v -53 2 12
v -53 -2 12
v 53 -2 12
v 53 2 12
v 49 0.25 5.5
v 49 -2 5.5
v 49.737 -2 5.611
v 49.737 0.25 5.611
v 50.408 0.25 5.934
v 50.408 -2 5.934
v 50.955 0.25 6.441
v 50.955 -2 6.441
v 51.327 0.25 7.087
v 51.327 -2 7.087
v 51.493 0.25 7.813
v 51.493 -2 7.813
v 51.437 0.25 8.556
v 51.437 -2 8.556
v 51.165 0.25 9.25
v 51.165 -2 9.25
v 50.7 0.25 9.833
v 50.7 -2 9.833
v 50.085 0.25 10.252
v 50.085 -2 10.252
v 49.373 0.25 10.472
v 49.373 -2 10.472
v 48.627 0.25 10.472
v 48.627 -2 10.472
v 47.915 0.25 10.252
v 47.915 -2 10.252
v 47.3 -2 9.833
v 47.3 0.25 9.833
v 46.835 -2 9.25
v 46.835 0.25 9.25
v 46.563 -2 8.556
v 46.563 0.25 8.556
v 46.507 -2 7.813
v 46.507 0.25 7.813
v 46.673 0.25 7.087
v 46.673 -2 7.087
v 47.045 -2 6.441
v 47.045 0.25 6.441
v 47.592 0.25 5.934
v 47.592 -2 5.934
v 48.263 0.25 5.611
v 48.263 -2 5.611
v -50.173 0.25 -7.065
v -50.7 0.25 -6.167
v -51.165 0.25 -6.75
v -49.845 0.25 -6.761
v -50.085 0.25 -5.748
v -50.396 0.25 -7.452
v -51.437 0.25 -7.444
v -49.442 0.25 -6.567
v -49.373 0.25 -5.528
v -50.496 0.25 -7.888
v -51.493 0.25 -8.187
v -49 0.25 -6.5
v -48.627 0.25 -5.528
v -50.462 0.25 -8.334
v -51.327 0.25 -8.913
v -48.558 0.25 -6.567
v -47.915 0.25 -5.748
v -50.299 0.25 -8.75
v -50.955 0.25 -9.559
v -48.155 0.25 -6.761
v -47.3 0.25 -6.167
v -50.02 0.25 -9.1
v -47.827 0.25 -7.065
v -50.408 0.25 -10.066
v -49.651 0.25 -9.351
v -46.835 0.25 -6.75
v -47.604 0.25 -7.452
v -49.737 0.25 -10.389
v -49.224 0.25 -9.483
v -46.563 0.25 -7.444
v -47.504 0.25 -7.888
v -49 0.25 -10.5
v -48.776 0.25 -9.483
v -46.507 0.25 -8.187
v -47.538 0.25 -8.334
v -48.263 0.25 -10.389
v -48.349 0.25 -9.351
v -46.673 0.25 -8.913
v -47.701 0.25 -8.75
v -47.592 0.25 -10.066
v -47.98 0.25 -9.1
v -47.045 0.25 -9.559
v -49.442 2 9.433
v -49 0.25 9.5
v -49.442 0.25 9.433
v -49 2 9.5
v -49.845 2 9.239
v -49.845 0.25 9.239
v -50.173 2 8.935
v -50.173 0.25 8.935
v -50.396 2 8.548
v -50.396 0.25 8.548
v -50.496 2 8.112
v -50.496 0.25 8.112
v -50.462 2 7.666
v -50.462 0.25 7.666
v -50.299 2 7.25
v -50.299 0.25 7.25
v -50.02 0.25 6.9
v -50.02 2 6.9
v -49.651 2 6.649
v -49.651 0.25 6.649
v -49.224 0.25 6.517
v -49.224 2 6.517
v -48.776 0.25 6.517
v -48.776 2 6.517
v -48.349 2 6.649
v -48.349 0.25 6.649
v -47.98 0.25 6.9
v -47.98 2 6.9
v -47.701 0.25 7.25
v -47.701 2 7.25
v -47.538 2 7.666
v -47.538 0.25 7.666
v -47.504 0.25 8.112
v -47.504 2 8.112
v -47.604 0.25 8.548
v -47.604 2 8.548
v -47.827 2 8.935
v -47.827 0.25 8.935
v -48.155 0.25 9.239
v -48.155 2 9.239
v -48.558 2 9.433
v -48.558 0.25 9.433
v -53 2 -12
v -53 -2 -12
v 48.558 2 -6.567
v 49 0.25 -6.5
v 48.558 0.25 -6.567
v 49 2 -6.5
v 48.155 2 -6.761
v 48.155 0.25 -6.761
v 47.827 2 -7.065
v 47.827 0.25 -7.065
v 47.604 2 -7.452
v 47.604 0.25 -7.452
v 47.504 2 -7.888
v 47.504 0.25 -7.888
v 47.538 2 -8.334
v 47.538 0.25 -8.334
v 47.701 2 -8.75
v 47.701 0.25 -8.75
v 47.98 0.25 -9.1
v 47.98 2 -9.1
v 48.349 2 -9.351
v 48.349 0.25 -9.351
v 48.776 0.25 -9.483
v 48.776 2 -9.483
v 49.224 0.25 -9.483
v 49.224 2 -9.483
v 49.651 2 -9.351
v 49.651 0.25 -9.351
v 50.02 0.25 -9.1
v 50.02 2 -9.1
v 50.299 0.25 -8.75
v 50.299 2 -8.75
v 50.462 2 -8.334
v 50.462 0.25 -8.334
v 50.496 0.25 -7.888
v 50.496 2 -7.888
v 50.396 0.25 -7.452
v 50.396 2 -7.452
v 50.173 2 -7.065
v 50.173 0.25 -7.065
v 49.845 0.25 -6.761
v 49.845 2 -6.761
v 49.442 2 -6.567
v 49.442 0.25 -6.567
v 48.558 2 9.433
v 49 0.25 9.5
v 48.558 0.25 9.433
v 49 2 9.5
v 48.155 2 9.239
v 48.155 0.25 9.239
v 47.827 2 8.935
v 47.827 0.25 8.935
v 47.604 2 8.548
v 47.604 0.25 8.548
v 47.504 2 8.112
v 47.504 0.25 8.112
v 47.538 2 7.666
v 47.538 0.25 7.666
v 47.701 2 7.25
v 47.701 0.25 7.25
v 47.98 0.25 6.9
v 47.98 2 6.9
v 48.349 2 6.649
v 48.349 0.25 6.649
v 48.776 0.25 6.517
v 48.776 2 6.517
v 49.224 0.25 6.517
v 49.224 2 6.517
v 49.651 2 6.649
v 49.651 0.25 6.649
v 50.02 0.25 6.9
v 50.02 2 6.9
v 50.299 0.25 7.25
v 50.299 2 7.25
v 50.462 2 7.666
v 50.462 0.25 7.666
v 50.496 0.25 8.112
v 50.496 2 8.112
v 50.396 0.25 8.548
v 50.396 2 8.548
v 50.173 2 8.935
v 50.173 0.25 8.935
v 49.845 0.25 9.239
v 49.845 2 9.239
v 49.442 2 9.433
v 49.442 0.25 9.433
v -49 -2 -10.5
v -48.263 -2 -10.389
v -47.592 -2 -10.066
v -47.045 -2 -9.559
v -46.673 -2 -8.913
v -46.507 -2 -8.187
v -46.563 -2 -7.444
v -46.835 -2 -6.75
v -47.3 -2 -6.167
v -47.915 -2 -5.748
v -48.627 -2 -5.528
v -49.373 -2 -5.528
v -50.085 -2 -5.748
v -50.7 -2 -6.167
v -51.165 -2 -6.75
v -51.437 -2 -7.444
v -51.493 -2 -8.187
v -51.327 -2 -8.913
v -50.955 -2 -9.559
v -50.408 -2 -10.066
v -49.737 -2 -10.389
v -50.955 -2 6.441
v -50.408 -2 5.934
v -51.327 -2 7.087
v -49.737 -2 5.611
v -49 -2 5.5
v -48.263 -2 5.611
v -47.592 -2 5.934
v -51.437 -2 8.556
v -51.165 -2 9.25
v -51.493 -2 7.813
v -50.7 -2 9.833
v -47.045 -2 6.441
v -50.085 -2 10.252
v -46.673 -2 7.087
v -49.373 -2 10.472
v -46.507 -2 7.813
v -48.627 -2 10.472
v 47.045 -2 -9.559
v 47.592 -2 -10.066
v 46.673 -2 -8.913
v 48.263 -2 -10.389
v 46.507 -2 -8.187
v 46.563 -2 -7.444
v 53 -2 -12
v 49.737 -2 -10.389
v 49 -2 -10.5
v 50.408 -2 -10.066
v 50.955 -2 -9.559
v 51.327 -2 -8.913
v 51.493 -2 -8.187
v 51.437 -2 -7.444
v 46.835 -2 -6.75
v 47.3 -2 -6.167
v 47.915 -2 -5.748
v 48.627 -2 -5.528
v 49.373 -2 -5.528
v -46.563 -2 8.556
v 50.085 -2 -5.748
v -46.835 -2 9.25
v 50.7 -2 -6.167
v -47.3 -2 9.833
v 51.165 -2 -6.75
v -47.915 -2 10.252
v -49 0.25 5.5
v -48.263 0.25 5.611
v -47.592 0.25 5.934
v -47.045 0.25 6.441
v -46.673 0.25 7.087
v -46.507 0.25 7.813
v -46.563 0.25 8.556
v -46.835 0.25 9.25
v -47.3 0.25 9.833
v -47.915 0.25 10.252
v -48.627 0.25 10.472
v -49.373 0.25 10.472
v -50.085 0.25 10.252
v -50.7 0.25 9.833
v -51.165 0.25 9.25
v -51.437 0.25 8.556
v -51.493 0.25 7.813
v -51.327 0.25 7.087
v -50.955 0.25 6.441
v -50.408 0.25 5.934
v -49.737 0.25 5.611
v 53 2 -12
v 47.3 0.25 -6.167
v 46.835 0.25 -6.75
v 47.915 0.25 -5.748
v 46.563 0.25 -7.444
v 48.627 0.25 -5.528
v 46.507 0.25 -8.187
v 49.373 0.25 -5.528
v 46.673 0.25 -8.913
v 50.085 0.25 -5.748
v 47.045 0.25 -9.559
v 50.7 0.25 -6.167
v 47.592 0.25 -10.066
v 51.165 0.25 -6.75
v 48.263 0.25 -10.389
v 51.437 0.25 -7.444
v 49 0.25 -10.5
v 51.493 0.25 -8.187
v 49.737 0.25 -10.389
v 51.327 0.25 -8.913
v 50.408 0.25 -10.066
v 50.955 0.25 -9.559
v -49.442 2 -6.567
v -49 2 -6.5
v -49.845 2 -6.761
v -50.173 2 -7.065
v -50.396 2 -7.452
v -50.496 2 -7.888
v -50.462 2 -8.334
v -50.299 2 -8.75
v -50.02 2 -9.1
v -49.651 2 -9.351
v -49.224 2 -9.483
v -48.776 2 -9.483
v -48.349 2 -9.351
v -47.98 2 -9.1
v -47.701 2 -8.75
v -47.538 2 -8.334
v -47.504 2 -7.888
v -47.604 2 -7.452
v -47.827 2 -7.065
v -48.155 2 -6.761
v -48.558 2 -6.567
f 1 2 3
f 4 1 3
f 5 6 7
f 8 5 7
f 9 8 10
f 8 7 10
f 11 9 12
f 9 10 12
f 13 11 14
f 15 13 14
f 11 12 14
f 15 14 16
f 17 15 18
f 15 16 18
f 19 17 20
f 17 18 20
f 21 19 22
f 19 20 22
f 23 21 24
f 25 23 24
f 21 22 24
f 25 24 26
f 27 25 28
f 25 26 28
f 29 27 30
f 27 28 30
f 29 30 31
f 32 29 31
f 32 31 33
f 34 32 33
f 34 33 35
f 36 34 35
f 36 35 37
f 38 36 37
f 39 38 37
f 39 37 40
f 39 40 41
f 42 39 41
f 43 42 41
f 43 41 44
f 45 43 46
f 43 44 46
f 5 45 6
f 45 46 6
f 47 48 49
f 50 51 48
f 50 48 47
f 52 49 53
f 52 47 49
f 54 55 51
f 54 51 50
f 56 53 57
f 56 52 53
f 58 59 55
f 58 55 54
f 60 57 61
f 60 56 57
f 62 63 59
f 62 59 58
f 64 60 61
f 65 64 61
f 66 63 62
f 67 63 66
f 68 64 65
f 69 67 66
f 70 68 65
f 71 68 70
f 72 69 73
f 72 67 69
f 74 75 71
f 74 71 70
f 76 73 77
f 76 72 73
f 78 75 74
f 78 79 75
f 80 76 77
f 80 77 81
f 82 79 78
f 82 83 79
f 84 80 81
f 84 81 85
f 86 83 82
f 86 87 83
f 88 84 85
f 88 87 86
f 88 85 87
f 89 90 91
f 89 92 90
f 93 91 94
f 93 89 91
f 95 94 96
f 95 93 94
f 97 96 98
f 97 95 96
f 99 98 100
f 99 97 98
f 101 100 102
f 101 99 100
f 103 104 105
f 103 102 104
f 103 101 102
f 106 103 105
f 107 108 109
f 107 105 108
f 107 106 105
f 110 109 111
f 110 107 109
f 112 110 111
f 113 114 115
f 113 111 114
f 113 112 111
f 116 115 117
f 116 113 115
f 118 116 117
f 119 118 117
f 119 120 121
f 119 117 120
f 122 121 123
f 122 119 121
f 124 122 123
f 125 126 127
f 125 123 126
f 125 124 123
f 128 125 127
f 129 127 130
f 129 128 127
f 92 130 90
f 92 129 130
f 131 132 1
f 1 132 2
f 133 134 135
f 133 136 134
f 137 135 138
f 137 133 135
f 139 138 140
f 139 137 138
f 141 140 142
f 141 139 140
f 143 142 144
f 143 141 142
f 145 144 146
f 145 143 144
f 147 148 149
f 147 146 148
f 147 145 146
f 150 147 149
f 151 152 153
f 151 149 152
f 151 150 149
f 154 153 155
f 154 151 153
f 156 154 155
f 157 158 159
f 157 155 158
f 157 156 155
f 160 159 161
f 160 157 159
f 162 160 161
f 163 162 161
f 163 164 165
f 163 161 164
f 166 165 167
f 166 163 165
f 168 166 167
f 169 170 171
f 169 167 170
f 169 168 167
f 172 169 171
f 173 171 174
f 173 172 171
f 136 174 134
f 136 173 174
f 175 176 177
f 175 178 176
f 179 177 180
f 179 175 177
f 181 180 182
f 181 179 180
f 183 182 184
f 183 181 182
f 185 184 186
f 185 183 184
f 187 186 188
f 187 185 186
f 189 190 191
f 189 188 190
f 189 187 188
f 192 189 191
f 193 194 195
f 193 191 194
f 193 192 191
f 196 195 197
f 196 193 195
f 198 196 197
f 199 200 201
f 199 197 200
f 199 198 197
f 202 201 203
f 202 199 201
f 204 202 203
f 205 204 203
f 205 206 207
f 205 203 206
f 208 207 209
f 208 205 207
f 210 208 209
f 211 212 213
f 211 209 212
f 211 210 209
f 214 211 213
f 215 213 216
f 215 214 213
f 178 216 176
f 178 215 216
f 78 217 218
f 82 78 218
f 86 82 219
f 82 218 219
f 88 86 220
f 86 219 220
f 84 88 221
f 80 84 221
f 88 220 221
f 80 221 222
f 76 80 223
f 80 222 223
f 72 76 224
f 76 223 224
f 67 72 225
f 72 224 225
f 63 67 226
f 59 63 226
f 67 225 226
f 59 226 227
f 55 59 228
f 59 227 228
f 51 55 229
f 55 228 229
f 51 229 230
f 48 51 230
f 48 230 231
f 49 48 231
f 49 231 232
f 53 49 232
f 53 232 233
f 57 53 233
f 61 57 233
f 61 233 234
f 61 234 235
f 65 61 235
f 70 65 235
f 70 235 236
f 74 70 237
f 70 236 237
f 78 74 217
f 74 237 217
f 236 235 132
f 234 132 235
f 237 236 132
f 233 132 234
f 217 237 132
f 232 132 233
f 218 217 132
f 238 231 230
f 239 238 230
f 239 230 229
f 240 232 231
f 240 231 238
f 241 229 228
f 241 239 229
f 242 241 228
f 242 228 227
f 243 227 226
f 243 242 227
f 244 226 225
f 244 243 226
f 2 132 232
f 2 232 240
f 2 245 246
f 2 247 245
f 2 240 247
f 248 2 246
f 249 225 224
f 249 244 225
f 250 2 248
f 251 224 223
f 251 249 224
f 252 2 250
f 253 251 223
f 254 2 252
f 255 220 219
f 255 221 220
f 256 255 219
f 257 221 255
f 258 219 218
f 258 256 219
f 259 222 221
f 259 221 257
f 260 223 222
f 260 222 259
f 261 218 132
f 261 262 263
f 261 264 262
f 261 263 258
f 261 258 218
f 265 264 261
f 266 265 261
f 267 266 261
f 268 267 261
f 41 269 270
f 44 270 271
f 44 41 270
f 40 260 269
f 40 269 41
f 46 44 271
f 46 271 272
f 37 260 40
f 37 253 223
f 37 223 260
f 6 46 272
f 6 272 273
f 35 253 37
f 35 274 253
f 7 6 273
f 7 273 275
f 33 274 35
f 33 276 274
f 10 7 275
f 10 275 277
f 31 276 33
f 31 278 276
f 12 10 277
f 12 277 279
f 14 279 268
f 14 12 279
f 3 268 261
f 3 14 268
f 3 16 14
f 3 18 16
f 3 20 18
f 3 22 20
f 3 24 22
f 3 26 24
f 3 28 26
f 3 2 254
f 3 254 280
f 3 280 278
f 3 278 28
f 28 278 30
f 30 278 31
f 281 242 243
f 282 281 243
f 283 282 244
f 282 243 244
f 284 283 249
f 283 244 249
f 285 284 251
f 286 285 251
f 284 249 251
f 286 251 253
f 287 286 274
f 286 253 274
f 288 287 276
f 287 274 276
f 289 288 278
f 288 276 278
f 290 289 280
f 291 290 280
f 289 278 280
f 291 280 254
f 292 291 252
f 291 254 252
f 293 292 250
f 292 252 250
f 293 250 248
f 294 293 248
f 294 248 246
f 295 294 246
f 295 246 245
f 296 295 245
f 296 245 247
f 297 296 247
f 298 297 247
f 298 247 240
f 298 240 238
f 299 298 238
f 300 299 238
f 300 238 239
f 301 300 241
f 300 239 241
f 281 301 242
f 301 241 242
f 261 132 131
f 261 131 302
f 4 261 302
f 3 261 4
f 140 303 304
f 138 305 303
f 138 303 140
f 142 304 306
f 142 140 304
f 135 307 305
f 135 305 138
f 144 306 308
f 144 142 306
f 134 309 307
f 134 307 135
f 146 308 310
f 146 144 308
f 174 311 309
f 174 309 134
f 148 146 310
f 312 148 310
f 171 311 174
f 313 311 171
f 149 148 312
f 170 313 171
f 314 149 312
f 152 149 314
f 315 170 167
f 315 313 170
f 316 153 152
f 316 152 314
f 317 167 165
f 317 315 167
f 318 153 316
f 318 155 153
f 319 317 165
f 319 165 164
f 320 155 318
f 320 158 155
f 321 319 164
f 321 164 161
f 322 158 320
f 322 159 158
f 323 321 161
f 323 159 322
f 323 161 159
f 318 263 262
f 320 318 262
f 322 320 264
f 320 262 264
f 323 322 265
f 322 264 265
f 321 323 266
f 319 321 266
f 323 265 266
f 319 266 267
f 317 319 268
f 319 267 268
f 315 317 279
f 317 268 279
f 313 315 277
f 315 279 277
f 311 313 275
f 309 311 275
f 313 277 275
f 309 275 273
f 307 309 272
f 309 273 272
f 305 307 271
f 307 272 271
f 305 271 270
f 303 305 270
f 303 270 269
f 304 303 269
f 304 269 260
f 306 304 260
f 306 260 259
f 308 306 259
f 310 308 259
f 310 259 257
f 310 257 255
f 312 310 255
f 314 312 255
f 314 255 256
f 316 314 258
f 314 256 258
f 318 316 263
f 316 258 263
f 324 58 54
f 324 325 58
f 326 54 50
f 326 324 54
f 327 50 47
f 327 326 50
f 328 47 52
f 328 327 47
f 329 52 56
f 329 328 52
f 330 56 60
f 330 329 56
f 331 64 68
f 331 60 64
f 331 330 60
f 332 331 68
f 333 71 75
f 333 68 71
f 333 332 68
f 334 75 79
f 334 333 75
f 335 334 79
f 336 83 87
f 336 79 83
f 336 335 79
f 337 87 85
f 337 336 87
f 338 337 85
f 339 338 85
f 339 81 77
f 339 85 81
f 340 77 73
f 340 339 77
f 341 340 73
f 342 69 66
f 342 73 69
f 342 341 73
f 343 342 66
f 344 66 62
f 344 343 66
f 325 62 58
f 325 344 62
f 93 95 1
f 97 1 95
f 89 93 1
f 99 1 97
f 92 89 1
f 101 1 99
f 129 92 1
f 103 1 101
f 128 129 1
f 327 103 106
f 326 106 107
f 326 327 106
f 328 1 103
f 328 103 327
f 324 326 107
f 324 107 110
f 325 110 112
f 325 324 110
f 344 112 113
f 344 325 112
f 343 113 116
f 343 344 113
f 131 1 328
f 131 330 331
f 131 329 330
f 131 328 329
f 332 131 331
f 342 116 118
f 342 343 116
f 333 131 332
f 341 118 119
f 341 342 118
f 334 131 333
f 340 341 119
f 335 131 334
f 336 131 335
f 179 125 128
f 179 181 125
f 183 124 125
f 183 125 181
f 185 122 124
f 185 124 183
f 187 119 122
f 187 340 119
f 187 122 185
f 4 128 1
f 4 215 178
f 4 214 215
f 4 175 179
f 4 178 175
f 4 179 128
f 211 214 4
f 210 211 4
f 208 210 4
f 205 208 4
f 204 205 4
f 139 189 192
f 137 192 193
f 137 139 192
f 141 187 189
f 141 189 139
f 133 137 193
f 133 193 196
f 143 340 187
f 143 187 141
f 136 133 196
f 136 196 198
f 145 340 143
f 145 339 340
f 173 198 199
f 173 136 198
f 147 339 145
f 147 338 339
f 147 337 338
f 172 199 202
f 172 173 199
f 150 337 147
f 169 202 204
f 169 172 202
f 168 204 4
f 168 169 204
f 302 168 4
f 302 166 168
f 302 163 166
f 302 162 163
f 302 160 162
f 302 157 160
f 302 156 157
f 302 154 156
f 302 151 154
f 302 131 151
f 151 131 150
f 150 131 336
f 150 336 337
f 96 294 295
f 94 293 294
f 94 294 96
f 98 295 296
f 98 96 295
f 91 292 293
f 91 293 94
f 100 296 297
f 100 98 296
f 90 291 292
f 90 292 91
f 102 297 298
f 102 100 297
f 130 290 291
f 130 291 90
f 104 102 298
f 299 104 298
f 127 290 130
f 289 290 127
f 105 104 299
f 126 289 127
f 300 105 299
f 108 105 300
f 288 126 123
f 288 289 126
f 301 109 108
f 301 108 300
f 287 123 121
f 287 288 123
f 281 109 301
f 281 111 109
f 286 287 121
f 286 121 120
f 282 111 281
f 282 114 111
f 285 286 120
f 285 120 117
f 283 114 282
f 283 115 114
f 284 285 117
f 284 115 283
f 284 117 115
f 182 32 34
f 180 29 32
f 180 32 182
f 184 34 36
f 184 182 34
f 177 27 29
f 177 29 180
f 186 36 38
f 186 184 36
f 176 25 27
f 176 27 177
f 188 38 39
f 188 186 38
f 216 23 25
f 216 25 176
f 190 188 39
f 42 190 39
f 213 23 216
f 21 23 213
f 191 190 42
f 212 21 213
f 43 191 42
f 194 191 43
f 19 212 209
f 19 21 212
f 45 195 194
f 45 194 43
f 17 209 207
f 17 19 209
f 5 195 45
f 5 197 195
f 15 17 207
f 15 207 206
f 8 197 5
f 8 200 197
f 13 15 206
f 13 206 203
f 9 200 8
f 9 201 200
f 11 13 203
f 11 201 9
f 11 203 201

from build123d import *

# Parameters (mm, degrees)
CROQUIS1_W              = 108
CROQUIS1_H              = 26
SALIENTE_EXTRUIR2_DEPTH = 2
CROQUIS3_R              = 1.5
CORTAR_EXTRUIR3_DEPTH   = 10
CROQUIS5_W              = 108
CROQUIS5_H              = 26
CROQUIS5_R              = 1.5
SALIENTE_EXTRUIR4_DEPTH = 2
CROQUIS6_R              = 2.5
CORTAR_EXTRUIR4_DEPTH   = 2.25
CROQUIS7_W              = 108
CROQUIS7_H              = 26
CROQUIS7_W_2            = 106
CROQUIS7_H_2            = 24
CORTAR_EXTRUIR5_DEPTH   = 19


with BuildPart() as part:
    # Croquis1 → Saliente-Extruir2 (new body)
    with BuildSketch(Plane(origin=(0, 0, 0), x_dir=(1, 0, 0), z_dir=(0, 1, 0))):
        Rectangle(CROQUIS1_W, CROQUIS1_H)
    extrude(amount=SALIENTE_EXTRUIR2_DEPTH)

    # Croquis3 → Cortar-Extruir3 (cut)
    with BuildSketch(Plane(origin=(0, 2, 0), x_dir=(1, 0, 0), z_dir=(0, 1, 0))):
        with Locations(Location((-49, 8, 0), (0, 0, 270))):
            Circle(CROQUIS3_R)
        with Locations(Location((-49, -8, 0), (0, 0, 270))):
            Circle(CROQUIS3_R)
        with Locations(Location((49, -8, 0), (0, 0, 270))):
            Circle(CROQUIS3_R)
        with Locations(Location((49, 8, 0), (0, 0, 270))):
            Circle(CROQUIS3_R)
    extrude(amount=-CORTAR_EXTRUIR3_DEPTH, mode=Mode.SUBTRACT)

    # Croquis5 → Saliente-Extruir4 (add)
    with BuildSketch(Plane.XZ):
        Rectangle(CROQUIS5_W, CROQUIS5_H)
        with Locations(Location((-49, -8, 0), (0, 0, 90))):
            Circle(CROQUIS5_R, mode=Mode.SUBTRACT)
        with Locations(Location((-49, 8, 0), (0, 0, 90))):
            Circle(CROQUIS5_R, mode=Mode.SUBTRACT)
        with Locations(Location((49, 8, 0), (0, 0, 90))):
            Circle(CROQUIS5_R, mode=Mode.SUBTRACT)
        with Locations(Location((49, -8, 0), (0, 0, 90))):
            Circle(CROQUIS5_R, mode=Mode.SUBTRACT)
    extrude(amount=SALIENTE_EXTRUIR4_DEPTH)

    # Croquis6 → Cortar-Extruir4 (cut)
    with BuildSketch(Plane.XZ.offset(2)):
        with Locations(Location((-49, -8, 0), (0, 0, 270))):
            Circle(CROQUIS6_R)
        with Locations(Location((-49, 8, 0), (0, 0, 270))):
            Circle(CROQUIS6_R)
        with Locations(Location((49, -8, 0), (0, 0, 270))):
            Circle(CROQUIS6_R)
        with Locations(Location((49, 8, 0), (0, 0, 270))):
            Circle(CROQUIS6_R)
    extrude(amount=-CORTAR_EXTRUIR4_DEPTH, mode=Mode.SUBTRACT)

    # Croquis7 → Cortar-Extruir5 (cut)
    with BuildSketch(Plane.XZ.offset(2)):
        Rectangle(CROQUIS7_W, CROQUIS7_H)
        Rectangle(CROQUIS7_W_2, CROQUIS7_H_2, mode=Mode.SUBTRACT)
    extrude(amount=-CORTAR_EXTRUIR5_DEPTH, mode=Mode.SUBTRACT)


solid = part.part
